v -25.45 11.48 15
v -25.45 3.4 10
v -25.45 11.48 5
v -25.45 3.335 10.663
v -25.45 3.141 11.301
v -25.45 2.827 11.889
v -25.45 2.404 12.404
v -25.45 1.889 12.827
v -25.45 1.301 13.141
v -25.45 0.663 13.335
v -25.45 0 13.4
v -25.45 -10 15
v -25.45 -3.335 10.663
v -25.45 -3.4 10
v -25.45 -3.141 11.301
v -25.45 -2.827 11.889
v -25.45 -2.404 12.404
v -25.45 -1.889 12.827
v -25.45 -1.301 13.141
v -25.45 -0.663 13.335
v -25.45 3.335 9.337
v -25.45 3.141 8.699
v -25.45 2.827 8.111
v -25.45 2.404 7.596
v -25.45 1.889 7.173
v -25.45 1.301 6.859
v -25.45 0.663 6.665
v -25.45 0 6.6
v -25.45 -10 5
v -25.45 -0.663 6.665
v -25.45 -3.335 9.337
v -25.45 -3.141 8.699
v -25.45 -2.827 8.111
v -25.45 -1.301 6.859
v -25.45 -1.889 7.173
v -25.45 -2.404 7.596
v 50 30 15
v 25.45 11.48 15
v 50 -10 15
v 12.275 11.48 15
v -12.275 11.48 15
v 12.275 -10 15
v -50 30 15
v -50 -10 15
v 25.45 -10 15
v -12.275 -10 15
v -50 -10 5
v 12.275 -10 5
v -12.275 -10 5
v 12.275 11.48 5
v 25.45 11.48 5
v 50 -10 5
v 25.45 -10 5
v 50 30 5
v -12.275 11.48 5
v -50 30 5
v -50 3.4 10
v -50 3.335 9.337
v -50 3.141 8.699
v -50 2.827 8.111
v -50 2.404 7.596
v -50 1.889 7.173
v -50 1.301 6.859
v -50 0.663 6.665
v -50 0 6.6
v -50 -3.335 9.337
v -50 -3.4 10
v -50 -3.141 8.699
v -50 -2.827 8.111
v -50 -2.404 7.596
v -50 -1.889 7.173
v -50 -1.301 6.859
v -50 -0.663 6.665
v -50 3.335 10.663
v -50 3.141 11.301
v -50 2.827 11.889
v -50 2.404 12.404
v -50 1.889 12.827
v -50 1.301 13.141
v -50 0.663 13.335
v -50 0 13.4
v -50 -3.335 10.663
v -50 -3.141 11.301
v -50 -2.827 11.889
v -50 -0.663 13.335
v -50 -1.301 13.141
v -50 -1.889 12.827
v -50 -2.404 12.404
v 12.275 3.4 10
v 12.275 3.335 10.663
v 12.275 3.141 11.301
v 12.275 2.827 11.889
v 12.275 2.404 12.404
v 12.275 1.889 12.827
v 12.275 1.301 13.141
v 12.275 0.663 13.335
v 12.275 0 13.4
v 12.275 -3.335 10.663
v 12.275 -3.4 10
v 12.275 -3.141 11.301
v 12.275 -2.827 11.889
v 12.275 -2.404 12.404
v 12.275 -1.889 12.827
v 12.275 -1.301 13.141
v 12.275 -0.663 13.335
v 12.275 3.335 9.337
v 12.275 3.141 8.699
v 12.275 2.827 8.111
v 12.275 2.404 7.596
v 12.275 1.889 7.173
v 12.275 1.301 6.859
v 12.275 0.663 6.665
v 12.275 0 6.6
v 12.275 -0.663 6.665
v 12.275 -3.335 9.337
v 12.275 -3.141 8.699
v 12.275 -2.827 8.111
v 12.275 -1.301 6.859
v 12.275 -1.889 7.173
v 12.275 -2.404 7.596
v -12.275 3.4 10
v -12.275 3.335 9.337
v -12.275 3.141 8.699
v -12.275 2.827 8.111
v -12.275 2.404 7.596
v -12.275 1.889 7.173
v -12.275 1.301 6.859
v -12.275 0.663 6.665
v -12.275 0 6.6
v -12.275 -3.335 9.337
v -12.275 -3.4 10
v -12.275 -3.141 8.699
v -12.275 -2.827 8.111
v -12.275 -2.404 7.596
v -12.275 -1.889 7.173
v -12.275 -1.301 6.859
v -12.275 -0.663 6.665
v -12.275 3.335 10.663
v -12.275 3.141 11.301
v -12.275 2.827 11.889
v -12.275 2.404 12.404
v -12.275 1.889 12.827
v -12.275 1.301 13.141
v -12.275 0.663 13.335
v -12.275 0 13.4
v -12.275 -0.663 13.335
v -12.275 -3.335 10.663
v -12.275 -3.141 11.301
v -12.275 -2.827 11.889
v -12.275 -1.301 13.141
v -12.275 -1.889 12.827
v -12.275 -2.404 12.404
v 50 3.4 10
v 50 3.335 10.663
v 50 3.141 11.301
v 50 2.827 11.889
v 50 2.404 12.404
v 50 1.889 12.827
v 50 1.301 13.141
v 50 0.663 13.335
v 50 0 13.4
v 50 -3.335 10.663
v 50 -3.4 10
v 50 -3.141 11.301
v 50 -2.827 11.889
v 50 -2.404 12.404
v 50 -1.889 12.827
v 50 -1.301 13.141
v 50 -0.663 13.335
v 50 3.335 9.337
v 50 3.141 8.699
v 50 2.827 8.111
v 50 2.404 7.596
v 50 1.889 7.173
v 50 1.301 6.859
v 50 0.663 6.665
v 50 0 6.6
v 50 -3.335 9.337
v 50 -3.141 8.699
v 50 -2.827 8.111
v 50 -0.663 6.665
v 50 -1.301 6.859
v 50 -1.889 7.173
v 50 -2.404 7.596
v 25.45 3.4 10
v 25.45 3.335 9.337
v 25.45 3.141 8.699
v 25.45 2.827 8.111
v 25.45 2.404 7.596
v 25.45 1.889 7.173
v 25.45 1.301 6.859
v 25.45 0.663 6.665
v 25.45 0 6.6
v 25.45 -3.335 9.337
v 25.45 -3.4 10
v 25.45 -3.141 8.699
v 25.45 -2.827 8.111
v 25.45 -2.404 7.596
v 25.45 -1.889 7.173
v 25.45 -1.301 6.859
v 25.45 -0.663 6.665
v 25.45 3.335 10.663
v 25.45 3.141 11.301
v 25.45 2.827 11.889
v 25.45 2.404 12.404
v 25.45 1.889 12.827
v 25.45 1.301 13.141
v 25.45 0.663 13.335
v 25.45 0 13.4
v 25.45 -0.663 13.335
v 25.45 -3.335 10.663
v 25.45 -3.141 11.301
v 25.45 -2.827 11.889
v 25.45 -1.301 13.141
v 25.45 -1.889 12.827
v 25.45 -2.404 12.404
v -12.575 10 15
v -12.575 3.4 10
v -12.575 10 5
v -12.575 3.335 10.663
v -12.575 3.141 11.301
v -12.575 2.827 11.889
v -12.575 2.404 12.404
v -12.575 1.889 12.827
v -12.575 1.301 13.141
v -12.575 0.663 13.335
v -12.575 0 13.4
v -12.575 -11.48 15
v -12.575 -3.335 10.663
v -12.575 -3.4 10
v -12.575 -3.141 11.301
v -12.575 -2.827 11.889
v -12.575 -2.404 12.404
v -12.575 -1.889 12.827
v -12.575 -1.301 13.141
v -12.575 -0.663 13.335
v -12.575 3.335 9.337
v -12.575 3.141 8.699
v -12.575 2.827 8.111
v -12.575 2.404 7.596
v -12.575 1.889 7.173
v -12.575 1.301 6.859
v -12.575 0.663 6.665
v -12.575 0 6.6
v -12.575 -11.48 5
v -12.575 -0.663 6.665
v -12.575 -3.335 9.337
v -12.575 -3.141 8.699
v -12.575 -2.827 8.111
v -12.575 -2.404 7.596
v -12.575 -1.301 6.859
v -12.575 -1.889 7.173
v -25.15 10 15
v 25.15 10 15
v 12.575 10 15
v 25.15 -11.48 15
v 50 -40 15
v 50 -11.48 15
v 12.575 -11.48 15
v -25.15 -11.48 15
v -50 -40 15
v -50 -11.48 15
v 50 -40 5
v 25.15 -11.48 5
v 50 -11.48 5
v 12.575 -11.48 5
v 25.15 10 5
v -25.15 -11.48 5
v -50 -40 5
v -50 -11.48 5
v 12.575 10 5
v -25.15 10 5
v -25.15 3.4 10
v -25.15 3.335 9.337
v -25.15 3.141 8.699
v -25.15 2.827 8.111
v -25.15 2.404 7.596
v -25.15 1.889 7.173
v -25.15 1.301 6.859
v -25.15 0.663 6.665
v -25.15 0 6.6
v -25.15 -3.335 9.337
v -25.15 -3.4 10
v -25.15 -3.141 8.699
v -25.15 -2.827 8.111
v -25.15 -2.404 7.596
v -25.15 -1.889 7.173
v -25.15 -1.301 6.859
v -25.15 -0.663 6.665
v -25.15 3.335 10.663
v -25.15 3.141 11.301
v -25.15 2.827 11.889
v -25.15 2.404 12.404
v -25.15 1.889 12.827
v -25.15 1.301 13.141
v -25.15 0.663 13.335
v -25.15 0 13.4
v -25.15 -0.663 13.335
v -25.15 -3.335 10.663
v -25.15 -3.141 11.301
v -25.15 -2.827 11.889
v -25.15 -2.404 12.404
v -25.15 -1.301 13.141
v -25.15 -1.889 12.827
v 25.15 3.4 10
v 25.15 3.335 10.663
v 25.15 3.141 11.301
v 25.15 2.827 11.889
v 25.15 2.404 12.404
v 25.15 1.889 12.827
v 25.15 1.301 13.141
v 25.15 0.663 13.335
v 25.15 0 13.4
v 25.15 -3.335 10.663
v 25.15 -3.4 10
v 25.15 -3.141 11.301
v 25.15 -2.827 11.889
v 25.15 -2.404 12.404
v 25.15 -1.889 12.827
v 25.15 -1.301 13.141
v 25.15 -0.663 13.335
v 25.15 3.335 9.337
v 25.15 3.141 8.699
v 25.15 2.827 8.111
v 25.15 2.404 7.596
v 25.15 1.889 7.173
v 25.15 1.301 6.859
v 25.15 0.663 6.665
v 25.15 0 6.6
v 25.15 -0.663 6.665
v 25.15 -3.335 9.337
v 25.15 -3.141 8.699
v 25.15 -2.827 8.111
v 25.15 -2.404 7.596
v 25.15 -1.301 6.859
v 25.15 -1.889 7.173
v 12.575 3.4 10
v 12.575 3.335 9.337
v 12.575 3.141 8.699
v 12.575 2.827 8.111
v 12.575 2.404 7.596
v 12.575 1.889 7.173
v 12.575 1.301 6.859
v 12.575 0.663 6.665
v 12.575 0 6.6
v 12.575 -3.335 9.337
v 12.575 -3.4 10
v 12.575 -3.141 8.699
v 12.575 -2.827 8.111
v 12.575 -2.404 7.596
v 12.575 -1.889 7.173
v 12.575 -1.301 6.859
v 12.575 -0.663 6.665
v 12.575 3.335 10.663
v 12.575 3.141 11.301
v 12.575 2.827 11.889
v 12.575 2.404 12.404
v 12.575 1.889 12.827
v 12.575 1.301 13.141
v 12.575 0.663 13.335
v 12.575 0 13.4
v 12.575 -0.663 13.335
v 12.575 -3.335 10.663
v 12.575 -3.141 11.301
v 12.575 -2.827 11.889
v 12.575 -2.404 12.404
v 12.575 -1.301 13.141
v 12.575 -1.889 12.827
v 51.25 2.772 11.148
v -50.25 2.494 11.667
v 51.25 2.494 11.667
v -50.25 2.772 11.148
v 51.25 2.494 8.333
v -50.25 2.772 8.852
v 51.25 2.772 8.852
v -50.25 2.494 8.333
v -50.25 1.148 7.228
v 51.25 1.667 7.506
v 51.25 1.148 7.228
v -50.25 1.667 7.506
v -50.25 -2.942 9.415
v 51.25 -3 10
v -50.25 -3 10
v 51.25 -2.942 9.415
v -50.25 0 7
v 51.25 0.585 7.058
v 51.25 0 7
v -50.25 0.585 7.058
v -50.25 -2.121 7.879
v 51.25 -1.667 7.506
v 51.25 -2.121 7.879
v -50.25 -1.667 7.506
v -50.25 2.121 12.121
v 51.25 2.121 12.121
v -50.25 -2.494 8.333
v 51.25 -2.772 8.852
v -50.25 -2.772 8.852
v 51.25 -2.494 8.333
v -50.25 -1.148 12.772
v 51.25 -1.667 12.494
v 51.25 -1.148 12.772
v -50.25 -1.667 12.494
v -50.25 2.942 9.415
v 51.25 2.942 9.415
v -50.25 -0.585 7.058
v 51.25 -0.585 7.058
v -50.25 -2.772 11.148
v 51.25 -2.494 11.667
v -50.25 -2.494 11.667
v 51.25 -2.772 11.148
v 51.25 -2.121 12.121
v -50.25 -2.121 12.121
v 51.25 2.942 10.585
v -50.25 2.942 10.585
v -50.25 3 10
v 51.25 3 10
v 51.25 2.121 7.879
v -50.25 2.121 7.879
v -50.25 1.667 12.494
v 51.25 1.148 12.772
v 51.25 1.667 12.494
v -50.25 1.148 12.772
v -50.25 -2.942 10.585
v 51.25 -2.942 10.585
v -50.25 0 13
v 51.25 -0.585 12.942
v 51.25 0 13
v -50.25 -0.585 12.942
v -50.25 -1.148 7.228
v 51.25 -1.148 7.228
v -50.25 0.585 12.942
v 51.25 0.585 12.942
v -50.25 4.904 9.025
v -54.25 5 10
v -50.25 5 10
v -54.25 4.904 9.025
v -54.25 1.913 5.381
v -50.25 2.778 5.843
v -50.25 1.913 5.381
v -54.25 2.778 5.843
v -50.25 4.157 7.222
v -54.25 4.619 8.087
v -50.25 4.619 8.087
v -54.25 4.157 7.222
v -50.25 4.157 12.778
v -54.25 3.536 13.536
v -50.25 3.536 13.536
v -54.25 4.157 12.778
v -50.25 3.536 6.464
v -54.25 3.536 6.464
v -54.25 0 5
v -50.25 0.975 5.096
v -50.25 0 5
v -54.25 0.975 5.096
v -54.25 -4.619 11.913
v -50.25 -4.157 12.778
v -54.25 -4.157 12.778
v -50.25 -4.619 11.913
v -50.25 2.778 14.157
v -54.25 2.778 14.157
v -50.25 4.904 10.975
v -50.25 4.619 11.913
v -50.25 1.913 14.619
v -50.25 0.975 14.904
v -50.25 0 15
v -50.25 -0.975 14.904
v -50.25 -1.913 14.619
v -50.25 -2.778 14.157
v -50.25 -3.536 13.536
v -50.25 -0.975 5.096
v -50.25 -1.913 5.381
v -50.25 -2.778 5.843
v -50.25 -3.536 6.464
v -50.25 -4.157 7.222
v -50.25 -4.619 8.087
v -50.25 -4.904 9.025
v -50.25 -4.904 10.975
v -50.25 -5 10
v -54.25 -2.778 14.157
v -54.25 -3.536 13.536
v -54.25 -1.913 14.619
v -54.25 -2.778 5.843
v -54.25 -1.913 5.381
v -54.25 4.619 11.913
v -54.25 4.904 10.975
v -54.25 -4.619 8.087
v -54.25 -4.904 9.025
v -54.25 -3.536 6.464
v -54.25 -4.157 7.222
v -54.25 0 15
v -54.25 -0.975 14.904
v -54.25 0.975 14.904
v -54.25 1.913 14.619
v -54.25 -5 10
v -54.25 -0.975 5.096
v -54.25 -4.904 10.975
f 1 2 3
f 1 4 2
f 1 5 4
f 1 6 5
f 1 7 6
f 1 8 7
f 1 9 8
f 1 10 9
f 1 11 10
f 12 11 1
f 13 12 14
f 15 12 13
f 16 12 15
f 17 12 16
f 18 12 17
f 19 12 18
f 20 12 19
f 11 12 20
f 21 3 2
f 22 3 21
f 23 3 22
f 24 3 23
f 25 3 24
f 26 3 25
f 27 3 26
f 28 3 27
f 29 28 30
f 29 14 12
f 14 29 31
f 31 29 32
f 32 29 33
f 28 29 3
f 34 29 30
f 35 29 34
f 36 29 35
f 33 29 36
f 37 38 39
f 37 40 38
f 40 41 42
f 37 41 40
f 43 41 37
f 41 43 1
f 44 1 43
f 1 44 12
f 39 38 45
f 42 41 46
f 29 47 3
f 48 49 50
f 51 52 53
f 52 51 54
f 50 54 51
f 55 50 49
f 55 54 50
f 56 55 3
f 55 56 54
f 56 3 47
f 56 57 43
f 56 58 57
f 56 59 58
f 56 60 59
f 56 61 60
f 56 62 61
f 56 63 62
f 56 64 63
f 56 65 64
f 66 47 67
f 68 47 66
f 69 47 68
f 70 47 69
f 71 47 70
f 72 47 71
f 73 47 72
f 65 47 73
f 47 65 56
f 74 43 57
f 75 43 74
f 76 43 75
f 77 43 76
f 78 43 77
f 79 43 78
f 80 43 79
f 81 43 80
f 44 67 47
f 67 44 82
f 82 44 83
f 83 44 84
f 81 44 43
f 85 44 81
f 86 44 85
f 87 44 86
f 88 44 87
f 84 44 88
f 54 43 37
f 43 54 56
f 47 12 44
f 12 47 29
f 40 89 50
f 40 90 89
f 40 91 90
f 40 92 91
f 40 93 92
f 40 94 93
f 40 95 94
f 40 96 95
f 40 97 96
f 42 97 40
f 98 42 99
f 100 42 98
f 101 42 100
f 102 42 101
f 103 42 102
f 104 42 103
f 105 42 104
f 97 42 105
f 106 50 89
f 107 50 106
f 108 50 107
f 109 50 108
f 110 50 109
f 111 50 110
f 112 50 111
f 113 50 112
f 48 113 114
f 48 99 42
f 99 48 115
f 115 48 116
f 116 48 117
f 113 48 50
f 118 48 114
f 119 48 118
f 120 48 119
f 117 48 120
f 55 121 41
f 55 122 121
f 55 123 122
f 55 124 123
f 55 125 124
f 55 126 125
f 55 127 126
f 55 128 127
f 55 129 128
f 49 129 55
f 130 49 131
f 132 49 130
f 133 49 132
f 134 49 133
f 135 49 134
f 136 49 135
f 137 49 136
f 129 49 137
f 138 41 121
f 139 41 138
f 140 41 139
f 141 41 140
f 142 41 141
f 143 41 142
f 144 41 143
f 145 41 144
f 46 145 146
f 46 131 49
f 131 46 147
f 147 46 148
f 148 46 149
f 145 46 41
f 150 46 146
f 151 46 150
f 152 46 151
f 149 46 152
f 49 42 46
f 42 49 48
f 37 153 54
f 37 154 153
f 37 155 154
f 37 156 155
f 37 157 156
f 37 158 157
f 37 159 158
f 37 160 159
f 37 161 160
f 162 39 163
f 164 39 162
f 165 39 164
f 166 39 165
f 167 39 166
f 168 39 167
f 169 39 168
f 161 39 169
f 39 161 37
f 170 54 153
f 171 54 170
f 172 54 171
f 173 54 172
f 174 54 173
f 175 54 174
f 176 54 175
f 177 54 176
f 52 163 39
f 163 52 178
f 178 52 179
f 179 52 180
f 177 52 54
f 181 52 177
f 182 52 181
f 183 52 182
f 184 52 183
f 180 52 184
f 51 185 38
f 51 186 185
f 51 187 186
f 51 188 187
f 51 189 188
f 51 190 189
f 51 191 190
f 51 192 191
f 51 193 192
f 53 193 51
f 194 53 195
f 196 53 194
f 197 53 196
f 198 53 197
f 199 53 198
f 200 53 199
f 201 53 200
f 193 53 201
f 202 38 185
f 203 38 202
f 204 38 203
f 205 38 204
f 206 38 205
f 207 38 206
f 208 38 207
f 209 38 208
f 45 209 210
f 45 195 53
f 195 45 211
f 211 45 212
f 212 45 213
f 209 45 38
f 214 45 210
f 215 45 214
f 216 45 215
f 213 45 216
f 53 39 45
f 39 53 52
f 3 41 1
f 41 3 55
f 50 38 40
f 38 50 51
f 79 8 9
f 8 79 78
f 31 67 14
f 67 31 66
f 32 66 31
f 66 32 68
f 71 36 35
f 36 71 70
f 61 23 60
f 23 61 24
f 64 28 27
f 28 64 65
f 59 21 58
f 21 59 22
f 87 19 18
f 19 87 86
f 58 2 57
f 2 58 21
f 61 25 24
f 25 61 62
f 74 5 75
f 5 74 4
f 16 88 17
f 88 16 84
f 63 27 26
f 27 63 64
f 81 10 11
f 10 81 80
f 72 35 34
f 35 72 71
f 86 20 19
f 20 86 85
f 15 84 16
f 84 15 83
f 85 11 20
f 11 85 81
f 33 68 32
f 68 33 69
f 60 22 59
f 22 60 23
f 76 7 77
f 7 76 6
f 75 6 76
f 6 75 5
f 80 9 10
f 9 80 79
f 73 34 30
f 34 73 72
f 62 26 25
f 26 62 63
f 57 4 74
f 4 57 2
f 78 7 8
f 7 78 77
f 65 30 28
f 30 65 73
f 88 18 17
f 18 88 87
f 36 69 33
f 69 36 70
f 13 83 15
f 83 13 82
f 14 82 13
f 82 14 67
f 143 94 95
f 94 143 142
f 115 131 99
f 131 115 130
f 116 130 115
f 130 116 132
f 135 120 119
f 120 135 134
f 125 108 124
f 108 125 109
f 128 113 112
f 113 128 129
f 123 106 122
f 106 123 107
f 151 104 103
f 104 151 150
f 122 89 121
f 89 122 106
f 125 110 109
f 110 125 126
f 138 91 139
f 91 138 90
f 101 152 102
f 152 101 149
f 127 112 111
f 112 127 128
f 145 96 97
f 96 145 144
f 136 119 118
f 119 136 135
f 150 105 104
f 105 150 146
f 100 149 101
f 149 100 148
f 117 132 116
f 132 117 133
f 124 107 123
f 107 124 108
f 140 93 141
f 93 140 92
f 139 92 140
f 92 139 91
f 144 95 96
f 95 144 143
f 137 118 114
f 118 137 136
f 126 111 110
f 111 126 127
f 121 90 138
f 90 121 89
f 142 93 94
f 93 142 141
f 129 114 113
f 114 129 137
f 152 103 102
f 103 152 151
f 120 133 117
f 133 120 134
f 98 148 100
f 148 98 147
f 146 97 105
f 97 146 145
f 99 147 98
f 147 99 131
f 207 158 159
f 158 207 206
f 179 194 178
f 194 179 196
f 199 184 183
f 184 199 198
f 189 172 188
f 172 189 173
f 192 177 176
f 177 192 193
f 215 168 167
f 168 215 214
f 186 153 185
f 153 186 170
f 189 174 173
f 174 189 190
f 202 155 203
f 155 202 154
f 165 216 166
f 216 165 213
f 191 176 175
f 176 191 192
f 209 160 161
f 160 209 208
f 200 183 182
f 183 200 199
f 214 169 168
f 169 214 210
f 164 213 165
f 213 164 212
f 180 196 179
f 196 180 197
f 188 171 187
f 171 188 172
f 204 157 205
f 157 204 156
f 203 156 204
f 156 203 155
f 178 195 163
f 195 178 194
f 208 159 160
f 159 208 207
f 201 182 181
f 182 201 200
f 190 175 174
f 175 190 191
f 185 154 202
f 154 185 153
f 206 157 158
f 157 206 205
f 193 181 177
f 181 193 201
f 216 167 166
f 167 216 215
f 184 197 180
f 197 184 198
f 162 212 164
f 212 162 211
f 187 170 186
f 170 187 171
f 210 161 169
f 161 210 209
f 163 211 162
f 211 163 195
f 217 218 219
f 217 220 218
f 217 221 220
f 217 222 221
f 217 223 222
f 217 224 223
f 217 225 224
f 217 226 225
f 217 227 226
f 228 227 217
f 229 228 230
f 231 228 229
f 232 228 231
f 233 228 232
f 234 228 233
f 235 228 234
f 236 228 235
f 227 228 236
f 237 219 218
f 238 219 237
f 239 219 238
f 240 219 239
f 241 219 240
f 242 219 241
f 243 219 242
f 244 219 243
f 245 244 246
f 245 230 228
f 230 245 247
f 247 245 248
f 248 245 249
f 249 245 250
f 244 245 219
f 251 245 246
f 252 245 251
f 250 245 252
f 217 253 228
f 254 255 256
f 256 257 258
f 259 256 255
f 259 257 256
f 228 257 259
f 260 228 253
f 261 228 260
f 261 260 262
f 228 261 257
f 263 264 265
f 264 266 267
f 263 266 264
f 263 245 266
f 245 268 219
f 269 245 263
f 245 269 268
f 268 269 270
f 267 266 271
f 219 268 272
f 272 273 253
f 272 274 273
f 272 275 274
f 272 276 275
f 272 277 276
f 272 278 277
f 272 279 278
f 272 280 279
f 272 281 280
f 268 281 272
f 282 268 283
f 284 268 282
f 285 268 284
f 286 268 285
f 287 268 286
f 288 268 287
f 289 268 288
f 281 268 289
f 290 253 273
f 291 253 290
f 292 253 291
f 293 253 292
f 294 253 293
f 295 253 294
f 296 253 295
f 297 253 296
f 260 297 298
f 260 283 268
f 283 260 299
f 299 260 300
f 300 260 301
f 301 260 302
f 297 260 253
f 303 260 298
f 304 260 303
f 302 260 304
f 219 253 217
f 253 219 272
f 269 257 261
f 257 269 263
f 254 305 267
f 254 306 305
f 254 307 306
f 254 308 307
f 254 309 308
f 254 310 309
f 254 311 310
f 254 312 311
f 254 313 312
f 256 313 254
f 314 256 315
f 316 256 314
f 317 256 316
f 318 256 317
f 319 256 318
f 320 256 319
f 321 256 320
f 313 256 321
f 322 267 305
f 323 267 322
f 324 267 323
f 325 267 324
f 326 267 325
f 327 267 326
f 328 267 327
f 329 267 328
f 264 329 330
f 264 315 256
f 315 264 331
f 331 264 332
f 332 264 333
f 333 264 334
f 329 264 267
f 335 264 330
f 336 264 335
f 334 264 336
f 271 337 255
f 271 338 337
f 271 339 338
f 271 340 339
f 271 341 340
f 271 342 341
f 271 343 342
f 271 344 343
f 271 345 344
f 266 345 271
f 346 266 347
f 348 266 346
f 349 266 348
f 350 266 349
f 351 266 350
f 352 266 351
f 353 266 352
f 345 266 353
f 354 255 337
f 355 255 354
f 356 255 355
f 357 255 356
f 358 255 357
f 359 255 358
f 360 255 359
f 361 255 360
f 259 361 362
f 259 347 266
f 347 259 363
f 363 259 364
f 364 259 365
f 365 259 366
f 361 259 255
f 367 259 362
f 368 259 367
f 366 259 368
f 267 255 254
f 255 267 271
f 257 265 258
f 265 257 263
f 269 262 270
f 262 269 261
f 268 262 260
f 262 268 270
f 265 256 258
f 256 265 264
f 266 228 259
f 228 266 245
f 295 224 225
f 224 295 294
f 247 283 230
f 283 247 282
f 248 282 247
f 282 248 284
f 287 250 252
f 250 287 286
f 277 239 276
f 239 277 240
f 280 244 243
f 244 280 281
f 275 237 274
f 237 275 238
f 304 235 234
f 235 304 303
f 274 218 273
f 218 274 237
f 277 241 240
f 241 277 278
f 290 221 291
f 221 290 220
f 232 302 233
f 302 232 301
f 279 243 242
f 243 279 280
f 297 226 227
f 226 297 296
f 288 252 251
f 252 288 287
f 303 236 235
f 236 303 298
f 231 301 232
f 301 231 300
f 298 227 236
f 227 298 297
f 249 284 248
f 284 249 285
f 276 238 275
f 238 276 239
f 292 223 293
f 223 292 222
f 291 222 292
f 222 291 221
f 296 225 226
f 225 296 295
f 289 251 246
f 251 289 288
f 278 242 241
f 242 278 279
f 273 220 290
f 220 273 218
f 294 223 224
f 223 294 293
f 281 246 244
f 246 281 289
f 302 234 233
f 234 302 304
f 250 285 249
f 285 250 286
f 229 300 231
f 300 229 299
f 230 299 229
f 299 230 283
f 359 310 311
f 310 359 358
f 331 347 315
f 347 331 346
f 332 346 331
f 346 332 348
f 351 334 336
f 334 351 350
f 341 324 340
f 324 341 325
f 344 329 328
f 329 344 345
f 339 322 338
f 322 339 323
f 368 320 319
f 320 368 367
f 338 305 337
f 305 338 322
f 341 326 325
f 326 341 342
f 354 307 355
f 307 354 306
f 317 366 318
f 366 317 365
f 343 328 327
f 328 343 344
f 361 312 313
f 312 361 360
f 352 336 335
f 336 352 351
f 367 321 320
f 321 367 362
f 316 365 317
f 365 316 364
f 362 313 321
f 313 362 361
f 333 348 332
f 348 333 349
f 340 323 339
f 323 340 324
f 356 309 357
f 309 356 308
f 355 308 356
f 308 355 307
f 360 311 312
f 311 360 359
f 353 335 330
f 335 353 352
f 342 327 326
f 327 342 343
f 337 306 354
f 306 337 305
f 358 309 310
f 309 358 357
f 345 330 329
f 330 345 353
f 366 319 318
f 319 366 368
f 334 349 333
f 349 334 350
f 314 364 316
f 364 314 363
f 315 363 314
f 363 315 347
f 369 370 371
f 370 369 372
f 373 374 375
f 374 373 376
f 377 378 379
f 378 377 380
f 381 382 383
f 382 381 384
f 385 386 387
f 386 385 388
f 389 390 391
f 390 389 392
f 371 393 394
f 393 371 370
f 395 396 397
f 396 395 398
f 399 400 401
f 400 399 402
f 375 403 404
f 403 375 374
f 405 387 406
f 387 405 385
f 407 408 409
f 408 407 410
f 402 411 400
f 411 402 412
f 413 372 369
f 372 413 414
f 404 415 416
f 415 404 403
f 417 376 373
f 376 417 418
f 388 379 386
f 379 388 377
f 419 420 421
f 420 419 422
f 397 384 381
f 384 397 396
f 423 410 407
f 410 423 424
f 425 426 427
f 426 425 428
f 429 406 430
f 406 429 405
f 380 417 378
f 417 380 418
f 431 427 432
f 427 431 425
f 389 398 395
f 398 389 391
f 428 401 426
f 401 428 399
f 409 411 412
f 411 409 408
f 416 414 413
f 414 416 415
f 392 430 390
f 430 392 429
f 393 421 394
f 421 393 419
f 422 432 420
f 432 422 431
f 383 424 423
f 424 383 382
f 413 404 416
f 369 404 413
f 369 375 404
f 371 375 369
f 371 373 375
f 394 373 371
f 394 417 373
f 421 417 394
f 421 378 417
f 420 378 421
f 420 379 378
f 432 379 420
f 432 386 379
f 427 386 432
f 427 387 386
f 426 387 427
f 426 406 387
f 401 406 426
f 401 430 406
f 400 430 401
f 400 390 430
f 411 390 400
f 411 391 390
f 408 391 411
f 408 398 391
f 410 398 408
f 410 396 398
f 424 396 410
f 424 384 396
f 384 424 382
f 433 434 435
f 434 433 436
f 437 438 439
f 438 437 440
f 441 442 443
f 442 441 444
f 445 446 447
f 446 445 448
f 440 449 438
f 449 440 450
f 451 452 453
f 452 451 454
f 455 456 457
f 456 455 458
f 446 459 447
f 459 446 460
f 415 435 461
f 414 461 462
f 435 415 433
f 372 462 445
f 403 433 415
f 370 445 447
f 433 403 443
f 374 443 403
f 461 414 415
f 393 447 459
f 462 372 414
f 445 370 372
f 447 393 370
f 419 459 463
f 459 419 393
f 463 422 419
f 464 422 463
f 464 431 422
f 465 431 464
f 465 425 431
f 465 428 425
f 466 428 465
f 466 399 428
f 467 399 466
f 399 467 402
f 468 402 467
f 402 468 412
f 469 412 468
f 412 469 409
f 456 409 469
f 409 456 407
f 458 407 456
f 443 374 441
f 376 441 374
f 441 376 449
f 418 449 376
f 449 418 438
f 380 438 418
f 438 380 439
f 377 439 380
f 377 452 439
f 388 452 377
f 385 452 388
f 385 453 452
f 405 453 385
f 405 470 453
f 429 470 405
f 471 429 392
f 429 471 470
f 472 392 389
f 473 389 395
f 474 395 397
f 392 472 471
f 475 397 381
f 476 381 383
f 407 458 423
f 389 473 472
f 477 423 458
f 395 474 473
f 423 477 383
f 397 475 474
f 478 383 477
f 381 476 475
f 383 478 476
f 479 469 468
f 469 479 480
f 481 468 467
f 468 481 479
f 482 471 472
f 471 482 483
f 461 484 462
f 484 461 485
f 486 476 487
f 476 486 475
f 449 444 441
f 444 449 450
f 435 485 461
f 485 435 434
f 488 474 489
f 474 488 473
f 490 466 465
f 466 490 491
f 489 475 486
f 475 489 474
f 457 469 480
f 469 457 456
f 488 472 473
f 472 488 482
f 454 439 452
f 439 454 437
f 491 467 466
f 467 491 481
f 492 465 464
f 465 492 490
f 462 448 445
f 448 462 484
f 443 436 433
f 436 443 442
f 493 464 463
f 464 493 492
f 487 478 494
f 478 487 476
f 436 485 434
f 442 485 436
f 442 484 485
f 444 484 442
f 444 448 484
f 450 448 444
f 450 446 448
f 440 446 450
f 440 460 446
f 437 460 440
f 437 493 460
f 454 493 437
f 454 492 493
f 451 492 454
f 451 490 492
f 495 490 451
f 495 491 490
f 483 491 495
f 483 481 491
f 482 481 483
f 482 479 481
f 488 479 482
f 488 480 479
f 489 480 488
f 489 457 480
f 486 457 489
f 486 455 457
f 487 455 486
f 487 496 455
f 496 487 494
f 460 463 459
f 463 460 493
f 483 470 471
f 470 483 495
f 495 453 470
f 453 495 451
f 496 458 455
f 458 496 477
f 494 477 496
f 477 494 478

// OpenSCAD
$fn = 32;

// ------------------------------------------------------------------------
// Butt hinge: hinge 100 mm, leaf swung 0 deg
// Every part is its own module, assembly() places every instance.
// ------------------------------------------------------------------------

// --- part 1 ---
module hinge_base() {
  difference() {
    union() {
      translate([-50, -10, -5]) cube([24.55, 40, 10]);
      translate([-12.275, -10, -5]) cube([24.55, 40, 10]);
      translate([25.45, -10, -5]) cube([24.55, 40, 10]);
      translate([-50, 11.48, -5]) cube([100, 18.52, 10]);
    }
    translate([-37.725, 0, 0]) rotate([0, 90, 0]) cylinder(h = 26.55, d = 6.8, center = true);
    translate([0, 0, 0]) rotate([0, 90, 0]) cylinder(h = 26.55, d = 6.8, center = true);
    translate([37.725, 0, 0]) rotate([0, 90, 0]) cylinder(h = 26.55, d = 6.8, center = true);
  }
}

// --- part 2 ---
module hinge_mover() {
  difference() {
    union() {
      translate([-25.15, -40, -5]) cube([12.575, 50, 10]);
      translate([12.575, -40, -5]) cube([12.575, 50, 10]);
      translate([-50, -40, -5]) cube([100, 28.52, 10]);
    }
    translate([-18.863, 0, 0]) rotate([0, 90, 0]) cylinder(h = 14.575, d = 6.8, center = true);
    translate([18.863, 0, 0]) rotate([0, 90, 0]) cylinder(h = 14.575, d = 6.8, center = true);
  }
}

// --- part 3 ---
module hinge_pin() {
  rotate([0, 90, 0]) cylinder(h = 102.5, d = 6, center = true);
  translate([-54.25, 0, 0]) rotate([0, 90, 0]) cylinder(h = 4, d = 10);
}

// --- assembly ---
module assembly() {
  color([0.80, 0.24, 0.20]) translate([0, 0, 10]) rotate([0, 0, 0]) hinge_base();
  color([0.20, 0.45, 0.75]) translate([0, 0, 10]) rotate([0, 0, 0]) hinge_mover();
  color([0.25, 0.62, 0.32]) translate([0, 0, 10]) rotate([0, 0, 0]) hinge_pin();
}

assembly();
